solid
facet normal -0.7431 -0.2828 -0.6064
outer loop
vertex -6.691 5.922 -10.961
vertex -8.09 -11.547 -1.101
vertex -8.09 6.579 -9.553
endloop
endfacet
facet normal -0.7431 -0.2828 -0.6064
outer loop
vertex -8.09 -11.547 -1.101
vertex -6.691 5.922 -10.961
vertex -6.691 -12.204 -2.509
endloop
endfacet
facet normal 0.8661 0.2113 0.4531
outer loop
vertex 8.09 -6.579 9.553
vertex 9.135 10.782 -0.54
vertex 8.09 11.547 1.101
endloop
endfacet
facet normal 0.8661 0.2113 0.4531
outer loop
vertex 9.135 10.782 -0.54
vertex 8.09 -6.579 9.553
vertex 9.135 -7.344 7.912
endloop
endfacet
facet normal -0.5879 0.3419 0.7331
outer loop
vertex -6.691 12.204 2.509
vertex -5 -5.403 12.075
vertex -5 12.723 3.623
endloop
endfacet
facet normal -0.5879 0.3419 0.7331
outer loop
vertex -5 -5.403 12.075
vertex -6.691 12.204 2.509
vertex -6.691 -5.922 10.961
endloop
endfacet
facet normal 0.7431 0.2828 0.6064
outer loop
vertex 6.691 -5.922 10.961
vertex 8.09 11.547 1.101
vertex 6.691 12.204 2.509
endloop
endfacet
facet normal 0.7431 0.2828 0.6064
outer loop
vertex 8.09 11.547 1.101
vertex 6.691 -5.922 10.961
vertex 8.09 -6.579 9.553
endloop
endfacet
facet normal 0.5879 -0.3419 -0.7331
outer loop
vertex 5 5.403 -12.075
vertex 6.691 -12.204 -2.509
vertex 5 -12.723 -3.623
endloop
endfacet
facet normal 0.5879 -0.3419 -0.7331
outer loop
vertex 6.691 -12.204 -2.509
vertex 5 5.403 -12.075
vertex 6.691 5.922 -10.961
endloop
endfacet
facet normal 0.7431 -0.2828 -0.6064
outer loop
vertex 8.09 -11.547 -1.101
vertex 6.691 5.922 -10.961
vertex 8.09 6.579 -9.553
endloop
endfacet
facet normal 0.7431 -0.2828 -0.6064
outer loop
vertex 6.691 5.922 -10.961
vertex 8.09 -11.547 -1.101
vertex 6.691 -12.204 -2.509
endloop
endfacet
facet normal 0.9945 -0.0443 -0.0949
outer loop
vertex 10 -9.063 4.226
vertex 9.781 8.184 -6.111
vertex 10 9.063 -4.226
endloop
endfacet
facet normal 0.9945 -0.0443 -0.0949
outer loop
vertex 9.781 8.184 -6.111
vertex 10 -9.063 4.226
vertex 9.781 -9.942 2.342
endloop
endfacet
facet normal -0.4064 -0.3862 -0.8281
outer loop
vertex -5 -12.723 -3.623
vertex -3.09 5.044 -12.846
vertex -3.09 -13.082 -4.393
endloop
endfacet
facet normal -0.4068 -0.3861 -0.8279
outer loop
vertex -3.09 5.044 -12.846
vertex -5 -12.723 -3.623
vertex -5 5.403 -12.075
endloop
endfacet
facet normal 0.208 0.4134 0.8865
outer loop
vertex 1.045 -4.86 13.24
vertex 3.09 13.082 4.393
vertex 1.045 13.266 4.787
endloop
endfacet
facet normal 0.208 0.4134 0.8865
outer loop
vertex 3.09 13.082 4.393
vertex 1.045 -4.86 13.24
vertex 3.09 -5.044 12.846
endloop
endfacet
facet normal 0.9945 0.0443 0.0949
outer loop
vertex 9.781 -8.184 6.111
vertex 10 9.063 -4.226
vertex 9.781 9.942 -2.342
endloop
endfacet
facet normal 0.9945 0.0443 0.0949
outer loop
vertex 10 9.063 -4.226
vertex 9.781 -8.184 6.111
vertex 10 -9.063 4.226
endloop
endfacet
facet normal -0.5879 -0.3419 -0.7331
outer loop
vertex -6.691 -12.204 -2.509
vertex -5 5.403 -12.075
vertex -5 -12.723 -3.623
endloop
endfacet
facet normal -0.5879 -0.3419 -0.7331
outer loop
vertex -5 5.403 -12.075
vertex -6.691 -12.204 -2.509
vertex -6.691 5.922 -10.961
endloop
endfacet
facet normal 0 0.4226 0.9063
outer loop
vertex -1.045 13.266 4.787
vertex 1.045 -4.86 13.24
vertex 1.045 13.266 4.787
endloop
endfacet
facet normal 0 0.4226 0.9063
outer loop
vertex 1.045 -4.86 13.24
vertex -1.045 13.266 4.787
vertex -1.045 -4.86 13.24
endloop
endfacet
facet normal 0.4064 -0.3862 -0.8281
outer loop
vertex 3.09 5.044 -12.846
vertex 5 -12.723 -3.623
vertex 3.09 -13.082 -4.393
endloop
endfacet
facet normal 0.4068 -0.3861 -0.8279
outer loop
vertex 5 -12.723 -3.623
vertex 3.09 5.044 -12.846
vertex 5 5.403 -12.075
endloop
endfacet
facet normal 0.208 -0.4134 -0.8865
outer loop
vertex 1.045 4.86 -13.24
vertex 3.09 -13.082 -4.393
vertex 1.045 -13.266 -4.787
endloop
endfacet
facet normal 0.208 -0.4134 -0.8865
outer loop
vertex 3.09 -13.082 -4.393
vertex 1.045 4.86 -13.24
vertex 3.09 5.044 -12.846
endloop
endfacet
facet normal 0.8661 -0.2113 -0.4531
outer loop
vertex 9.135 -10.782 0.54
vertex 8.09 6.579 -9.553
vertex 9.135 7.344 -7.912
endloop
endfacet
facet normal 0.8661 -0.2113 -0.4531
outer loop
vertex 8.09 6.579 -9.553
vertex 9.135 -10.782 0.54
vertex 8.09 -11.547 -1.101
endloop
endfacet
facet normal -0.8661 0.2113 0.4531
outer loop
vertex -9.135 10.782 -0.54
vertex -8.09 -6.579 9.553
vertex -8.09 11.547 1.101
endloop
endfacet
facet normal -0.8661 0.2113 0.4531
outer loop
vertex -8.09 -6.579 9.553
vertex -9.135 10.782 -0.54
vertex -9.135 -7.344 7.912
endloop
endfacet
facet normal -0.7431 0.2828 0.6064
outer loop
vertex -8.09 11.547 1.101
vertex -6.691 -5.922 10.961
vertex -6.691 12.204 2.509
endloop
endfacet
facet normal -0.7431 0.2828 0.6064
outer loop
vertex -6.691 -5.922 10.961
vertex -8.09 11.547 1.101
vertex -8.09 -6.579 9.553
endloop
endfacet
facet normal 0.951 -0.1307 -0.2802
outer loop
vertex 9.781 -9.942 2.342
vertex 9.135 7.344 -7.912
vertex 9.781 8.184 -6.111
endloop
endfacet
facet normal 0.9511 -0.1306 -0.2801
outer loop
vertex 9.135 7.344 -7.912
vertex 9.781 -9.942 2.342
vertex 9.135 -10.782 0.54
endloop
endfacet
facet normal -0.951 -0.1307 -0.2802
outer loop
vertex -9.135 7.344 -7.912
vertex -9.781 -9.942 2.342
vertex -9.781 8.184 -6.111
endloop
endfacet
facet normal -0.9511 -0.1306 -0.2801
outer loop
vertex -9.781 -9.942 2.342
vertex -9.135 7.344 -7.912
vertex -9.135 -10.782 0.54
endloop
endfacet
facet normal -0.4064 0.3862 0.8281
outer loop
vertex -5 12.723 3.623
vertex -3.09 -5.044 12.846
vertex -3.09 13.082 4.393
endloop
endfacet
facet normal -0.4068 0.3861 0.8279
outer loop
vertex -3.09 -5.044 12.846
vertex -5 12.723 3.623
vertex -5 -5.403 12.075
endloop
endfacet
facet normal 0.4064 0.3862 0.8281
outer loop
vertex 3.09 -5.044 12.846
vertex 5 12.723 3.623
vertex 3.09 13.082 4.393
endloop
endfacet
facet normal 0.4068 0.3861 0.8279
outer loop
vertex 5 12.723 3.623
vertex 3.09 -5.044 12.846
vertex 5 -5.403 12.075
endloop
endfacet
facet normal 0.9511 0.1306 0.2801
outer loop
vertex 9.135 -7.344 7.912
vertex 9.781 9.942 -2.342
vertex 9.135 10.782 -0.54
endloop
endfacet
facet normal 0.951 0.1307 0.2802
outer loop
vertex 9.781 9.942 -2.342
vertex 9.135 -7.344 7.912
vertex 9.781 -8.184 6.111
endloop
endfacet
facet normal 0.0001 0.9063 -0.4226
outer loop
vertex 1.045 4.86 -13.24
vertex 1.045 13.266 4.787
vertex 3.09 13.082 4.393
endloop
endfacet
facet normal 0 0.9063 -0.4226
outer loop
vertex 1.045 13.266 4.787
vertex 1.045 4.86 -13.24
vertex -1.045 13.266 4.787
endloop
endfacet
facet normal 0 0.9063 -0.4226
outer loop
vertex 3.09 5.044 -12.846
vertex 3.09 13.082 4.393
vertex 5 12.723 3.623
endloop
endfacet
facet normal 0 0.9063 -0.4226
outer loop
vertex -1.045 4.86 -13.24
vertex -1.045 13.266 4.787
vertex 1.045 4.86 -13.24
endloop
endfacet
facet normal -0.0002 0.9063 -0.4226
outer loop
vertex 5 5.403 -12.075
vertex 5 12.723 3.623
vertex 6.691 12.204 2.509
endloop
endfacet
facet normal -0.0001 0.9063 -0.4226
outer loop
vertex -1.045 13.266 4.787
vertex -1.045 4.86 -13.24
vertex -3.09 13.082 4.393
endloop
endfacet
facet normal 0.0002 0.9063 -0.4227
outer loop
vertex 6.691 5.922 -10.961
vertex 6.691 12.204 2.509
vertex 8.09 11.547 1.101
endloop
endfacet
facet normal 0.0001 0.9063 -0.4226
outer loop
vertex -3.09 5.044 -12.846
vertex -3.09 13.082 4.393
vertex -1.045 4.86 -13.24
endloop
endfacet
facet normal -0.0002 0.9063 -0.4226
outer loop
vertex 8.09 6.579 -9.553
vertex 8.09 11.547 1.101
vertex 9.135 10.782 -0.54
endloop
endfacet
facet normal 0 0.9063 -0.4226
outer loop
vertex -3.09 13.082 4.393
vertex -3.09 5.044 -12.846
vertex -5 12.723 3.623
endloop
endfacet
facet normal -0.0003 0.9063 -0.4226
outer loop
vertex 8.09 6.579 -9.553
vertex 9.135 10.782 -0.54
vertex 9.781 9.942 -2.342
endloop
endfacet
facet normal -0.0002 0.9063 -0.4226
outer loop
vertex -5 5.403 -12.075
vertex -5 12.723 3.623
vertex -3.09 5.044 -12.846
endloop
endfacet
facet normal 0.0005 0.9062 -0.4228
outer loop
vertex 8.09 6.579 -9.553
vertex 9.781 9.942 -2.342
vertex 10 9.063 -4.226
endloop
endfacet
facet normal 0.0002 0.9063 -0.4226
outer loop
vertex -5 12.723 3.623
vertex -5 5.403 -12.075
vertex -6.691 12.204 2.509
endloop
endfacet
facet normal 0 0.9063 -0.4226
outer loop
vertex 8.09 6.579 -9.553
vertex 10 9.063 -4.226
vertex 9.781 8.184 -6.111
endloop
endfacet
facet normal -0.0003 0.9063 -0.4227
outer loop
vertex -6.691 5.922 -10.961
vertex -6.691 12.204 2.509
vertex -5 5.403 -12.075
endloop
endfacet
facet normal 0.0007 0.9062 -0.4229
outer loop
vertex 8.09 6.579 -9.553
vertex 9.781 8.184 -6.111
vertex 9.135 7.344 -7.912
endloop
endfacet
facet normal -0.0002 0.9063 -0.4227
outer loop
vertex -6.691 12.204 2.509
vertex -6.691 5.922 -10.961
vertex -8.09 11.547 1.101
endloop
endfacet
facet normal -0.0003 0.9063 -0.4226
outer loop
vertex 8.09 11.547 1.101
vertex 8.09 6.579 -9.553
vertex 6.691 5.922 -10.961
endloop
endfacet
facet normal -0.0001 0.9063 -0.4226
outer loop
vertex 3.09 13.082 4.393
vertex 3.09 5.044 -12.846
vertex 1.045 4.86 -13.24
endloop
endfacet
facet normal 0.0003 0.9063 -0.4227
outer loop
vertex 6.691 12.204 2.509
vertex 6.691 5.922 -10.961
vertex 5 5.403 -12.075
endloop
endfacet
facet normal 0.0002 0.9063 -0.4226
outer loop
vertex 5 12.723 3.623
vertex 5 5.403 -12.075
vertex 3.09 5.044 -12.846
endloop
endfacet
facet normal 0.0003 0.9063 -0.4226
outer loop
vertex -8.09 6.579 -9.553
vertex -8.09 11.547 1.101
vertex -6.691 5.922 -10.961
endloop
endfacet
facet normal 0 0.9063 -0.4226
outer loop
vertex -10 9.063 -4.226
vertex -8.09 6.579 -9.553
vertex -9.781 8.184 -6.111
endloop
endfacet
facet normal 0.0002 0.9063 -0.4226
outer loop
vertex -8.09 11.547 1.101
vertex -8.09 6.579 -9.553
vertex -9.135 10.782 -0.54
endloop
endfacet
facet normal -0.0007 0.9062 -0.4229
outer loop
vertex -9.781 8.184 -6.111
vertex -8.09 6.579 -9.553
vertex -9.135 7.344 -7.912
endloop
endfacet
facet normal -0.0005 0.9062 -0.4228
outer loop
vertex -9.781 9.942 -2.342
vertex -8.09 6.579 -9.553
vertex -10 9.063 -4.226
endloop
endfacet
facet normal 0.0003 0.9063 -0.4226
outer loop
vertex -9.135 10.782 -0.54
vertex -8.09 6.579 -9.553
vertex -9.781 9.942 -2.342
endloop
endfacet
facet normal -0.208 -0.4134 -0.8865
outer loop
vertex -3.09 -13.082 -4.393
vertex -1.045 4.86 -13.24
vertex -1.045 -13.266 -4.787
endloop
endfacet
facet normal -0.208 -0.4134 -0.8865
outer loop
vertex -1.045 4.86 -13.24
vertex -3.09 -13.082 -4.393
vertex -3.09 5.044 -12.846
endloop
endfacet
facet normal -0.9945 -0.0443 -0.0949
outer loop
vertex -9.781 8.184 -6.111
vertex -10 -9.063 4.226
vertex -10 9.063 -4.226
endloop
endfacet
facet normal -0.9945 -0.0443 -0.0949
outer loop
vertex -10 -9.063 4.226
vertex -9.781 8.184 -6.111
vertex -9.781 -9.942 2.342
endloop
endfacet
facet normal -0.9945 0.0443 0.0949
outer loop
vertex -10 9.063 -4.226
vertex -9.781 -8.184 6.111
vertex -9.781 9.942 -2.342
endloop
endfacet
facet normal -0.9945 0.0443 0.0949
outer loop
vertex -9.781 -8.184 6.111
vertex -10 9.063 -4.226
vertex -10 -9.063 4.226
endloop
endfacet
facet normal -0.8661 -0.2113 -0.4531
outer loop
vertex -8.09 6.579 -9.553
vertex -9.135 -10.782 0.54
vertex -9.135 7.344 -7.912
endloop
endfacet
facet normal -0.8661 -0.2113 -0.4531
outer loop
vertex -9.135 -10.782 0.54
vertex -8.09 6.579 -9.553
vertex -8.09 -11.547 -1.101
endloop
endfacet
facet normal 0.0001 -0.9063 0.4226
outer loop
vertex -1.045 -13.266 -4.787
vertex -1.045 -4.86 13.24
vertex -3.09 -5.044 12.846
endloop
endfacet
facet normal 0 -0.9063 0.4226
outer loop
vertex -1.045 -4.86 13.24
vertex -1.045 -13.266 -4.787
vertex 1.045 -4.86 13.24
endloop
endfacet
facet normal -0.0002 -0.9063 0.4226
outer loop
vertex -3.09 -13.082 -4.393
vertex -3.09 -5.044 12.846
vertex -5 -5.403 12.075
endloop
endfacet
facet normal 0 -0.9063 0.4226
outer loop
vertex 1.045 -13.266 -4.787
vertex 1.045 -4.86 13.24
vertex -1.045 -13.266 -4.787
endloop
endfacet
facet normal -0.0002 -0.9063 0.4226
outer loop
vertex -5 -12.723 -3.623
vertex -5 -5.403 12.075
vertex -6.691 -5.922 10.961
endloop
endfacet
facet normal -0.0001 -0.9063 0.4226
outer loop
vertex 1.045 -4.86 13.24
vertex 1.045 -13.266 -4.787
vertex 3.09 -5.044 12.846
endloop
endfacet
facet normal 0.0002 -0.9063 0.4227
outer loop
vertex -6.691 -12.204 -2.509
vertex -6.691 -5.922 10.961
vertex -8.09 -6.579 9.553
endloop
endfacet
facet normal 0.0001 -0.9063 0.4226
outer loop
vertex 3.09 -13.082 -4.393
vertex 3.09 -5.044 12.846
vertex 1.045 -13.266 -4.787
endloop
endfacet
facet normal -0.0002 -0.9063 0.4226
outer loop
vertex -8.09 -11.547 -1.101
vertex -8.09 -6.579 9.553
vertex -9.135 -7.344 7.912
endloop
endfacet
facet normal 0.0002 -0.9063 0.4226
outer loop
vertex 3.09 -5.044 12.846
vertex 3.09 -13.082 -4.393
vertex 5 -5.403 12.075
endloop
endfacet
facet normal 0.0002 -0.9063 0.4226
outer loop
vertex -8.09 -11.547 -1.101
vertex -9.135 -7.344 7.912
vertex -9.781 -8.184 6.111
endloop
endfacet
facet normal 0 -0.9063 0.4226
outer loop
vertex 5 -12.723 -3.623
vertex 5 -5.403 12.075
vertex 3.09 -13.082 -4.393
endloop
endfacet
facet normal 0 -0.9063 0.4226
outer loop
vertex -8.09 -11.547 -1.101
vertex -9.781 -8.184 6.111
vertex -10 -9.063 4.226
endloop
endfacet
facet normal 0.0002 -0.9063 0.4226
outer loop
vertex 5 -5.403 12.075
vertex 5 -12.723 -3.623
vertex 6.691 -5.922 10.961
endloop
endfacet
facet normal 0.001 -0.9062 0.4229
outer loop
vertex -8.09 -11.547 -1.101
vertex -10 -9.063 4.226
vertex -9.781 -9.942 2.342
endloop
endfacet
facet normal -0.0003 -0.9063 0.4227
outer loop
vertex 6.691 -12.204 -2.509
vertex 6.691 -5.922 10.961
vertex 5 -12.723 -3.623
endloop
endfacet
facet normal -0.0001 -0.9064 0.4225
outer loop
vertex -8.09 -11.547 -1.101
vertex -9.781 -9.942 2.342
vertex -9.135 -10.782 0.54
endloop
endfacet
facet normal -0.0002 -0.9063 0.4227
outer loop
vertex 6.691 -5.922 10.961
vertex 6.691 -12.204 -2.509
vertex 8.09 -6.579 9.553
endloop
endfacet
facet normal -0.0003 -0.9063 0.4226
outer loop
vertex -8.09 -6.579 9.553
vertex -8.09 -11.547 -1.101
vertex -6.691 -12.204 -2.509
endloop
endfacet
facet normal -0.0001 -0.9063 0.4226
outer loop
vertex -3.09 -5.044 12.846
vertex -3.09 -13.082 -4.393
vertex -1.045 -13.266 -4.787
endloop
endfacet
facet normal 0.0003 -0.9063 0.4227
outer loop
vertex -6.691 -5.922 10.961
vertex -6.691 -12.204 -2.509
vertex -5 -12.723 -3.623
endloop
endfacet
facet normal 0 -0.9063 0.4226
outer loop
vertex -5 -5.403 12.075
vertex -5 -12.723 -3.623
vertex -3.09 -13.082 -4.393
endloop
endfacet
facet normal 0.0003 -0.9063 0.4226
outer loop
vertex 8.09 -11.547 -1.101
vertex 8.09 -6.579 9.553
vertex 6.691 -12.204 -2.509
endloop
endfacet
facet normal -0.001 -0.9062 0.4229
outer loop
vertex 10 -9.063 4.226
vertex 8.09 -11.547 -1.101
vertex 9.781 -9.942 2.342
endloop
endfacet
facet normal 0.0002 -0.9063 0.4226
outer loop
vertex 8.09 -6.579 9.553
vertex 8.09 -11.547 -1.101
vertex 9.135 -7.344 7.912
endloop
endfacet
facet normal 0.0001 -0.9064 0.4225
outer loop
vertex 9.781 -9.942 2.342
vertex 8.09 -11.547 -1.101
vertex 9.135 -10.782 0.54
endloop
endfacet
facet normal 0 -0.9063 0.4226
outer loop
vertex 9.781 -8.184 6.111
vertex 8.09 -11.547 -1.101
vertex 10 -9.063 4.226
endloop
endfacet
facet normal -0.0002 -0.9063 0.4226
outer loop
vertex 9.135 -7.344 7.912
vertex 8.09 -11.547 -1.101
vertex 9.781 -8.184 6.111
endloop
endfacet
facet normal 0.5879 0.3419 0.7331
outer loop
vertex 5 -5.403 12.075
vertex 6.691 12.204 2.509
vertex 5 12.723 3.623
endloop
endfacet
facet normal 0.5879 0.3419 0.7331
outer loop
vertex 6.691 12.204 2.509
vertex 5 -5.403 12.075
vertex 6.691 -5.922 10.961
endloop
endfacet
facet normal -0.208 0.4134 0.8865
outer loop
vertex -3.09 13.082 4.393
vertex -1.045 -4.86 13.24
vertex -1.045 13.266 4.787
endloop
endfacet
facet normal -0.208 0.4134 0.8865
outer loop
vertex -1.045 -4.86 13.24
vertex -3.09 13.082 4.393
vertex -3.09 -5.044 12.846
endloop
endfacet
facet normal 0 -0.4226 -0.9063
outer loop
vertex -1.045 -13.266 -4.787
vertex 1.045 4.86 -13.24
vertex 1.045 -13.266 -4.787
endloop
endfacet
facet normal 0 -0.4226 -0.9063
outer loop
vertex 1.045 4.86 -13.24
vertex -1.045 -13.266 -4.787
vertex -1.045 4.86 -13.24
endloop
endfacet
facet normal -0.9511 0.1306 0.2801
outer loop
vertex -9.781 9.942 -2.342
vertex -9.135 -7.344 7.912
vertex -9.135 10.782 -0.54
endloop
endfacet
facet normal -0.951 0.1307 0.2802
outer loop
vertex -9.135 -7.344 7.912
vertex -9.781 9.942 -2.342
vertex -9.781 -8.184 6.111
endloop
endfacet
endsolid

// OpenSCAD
module handle(){
	rotate_extrude(convexity = 10, $fn = 100)
	translate([10, 0, 0])
	circle(r = 10, $fn = 100);
	cylinder(r=10,h=20, center=true);
}


rotate([65,0,0])handle();
